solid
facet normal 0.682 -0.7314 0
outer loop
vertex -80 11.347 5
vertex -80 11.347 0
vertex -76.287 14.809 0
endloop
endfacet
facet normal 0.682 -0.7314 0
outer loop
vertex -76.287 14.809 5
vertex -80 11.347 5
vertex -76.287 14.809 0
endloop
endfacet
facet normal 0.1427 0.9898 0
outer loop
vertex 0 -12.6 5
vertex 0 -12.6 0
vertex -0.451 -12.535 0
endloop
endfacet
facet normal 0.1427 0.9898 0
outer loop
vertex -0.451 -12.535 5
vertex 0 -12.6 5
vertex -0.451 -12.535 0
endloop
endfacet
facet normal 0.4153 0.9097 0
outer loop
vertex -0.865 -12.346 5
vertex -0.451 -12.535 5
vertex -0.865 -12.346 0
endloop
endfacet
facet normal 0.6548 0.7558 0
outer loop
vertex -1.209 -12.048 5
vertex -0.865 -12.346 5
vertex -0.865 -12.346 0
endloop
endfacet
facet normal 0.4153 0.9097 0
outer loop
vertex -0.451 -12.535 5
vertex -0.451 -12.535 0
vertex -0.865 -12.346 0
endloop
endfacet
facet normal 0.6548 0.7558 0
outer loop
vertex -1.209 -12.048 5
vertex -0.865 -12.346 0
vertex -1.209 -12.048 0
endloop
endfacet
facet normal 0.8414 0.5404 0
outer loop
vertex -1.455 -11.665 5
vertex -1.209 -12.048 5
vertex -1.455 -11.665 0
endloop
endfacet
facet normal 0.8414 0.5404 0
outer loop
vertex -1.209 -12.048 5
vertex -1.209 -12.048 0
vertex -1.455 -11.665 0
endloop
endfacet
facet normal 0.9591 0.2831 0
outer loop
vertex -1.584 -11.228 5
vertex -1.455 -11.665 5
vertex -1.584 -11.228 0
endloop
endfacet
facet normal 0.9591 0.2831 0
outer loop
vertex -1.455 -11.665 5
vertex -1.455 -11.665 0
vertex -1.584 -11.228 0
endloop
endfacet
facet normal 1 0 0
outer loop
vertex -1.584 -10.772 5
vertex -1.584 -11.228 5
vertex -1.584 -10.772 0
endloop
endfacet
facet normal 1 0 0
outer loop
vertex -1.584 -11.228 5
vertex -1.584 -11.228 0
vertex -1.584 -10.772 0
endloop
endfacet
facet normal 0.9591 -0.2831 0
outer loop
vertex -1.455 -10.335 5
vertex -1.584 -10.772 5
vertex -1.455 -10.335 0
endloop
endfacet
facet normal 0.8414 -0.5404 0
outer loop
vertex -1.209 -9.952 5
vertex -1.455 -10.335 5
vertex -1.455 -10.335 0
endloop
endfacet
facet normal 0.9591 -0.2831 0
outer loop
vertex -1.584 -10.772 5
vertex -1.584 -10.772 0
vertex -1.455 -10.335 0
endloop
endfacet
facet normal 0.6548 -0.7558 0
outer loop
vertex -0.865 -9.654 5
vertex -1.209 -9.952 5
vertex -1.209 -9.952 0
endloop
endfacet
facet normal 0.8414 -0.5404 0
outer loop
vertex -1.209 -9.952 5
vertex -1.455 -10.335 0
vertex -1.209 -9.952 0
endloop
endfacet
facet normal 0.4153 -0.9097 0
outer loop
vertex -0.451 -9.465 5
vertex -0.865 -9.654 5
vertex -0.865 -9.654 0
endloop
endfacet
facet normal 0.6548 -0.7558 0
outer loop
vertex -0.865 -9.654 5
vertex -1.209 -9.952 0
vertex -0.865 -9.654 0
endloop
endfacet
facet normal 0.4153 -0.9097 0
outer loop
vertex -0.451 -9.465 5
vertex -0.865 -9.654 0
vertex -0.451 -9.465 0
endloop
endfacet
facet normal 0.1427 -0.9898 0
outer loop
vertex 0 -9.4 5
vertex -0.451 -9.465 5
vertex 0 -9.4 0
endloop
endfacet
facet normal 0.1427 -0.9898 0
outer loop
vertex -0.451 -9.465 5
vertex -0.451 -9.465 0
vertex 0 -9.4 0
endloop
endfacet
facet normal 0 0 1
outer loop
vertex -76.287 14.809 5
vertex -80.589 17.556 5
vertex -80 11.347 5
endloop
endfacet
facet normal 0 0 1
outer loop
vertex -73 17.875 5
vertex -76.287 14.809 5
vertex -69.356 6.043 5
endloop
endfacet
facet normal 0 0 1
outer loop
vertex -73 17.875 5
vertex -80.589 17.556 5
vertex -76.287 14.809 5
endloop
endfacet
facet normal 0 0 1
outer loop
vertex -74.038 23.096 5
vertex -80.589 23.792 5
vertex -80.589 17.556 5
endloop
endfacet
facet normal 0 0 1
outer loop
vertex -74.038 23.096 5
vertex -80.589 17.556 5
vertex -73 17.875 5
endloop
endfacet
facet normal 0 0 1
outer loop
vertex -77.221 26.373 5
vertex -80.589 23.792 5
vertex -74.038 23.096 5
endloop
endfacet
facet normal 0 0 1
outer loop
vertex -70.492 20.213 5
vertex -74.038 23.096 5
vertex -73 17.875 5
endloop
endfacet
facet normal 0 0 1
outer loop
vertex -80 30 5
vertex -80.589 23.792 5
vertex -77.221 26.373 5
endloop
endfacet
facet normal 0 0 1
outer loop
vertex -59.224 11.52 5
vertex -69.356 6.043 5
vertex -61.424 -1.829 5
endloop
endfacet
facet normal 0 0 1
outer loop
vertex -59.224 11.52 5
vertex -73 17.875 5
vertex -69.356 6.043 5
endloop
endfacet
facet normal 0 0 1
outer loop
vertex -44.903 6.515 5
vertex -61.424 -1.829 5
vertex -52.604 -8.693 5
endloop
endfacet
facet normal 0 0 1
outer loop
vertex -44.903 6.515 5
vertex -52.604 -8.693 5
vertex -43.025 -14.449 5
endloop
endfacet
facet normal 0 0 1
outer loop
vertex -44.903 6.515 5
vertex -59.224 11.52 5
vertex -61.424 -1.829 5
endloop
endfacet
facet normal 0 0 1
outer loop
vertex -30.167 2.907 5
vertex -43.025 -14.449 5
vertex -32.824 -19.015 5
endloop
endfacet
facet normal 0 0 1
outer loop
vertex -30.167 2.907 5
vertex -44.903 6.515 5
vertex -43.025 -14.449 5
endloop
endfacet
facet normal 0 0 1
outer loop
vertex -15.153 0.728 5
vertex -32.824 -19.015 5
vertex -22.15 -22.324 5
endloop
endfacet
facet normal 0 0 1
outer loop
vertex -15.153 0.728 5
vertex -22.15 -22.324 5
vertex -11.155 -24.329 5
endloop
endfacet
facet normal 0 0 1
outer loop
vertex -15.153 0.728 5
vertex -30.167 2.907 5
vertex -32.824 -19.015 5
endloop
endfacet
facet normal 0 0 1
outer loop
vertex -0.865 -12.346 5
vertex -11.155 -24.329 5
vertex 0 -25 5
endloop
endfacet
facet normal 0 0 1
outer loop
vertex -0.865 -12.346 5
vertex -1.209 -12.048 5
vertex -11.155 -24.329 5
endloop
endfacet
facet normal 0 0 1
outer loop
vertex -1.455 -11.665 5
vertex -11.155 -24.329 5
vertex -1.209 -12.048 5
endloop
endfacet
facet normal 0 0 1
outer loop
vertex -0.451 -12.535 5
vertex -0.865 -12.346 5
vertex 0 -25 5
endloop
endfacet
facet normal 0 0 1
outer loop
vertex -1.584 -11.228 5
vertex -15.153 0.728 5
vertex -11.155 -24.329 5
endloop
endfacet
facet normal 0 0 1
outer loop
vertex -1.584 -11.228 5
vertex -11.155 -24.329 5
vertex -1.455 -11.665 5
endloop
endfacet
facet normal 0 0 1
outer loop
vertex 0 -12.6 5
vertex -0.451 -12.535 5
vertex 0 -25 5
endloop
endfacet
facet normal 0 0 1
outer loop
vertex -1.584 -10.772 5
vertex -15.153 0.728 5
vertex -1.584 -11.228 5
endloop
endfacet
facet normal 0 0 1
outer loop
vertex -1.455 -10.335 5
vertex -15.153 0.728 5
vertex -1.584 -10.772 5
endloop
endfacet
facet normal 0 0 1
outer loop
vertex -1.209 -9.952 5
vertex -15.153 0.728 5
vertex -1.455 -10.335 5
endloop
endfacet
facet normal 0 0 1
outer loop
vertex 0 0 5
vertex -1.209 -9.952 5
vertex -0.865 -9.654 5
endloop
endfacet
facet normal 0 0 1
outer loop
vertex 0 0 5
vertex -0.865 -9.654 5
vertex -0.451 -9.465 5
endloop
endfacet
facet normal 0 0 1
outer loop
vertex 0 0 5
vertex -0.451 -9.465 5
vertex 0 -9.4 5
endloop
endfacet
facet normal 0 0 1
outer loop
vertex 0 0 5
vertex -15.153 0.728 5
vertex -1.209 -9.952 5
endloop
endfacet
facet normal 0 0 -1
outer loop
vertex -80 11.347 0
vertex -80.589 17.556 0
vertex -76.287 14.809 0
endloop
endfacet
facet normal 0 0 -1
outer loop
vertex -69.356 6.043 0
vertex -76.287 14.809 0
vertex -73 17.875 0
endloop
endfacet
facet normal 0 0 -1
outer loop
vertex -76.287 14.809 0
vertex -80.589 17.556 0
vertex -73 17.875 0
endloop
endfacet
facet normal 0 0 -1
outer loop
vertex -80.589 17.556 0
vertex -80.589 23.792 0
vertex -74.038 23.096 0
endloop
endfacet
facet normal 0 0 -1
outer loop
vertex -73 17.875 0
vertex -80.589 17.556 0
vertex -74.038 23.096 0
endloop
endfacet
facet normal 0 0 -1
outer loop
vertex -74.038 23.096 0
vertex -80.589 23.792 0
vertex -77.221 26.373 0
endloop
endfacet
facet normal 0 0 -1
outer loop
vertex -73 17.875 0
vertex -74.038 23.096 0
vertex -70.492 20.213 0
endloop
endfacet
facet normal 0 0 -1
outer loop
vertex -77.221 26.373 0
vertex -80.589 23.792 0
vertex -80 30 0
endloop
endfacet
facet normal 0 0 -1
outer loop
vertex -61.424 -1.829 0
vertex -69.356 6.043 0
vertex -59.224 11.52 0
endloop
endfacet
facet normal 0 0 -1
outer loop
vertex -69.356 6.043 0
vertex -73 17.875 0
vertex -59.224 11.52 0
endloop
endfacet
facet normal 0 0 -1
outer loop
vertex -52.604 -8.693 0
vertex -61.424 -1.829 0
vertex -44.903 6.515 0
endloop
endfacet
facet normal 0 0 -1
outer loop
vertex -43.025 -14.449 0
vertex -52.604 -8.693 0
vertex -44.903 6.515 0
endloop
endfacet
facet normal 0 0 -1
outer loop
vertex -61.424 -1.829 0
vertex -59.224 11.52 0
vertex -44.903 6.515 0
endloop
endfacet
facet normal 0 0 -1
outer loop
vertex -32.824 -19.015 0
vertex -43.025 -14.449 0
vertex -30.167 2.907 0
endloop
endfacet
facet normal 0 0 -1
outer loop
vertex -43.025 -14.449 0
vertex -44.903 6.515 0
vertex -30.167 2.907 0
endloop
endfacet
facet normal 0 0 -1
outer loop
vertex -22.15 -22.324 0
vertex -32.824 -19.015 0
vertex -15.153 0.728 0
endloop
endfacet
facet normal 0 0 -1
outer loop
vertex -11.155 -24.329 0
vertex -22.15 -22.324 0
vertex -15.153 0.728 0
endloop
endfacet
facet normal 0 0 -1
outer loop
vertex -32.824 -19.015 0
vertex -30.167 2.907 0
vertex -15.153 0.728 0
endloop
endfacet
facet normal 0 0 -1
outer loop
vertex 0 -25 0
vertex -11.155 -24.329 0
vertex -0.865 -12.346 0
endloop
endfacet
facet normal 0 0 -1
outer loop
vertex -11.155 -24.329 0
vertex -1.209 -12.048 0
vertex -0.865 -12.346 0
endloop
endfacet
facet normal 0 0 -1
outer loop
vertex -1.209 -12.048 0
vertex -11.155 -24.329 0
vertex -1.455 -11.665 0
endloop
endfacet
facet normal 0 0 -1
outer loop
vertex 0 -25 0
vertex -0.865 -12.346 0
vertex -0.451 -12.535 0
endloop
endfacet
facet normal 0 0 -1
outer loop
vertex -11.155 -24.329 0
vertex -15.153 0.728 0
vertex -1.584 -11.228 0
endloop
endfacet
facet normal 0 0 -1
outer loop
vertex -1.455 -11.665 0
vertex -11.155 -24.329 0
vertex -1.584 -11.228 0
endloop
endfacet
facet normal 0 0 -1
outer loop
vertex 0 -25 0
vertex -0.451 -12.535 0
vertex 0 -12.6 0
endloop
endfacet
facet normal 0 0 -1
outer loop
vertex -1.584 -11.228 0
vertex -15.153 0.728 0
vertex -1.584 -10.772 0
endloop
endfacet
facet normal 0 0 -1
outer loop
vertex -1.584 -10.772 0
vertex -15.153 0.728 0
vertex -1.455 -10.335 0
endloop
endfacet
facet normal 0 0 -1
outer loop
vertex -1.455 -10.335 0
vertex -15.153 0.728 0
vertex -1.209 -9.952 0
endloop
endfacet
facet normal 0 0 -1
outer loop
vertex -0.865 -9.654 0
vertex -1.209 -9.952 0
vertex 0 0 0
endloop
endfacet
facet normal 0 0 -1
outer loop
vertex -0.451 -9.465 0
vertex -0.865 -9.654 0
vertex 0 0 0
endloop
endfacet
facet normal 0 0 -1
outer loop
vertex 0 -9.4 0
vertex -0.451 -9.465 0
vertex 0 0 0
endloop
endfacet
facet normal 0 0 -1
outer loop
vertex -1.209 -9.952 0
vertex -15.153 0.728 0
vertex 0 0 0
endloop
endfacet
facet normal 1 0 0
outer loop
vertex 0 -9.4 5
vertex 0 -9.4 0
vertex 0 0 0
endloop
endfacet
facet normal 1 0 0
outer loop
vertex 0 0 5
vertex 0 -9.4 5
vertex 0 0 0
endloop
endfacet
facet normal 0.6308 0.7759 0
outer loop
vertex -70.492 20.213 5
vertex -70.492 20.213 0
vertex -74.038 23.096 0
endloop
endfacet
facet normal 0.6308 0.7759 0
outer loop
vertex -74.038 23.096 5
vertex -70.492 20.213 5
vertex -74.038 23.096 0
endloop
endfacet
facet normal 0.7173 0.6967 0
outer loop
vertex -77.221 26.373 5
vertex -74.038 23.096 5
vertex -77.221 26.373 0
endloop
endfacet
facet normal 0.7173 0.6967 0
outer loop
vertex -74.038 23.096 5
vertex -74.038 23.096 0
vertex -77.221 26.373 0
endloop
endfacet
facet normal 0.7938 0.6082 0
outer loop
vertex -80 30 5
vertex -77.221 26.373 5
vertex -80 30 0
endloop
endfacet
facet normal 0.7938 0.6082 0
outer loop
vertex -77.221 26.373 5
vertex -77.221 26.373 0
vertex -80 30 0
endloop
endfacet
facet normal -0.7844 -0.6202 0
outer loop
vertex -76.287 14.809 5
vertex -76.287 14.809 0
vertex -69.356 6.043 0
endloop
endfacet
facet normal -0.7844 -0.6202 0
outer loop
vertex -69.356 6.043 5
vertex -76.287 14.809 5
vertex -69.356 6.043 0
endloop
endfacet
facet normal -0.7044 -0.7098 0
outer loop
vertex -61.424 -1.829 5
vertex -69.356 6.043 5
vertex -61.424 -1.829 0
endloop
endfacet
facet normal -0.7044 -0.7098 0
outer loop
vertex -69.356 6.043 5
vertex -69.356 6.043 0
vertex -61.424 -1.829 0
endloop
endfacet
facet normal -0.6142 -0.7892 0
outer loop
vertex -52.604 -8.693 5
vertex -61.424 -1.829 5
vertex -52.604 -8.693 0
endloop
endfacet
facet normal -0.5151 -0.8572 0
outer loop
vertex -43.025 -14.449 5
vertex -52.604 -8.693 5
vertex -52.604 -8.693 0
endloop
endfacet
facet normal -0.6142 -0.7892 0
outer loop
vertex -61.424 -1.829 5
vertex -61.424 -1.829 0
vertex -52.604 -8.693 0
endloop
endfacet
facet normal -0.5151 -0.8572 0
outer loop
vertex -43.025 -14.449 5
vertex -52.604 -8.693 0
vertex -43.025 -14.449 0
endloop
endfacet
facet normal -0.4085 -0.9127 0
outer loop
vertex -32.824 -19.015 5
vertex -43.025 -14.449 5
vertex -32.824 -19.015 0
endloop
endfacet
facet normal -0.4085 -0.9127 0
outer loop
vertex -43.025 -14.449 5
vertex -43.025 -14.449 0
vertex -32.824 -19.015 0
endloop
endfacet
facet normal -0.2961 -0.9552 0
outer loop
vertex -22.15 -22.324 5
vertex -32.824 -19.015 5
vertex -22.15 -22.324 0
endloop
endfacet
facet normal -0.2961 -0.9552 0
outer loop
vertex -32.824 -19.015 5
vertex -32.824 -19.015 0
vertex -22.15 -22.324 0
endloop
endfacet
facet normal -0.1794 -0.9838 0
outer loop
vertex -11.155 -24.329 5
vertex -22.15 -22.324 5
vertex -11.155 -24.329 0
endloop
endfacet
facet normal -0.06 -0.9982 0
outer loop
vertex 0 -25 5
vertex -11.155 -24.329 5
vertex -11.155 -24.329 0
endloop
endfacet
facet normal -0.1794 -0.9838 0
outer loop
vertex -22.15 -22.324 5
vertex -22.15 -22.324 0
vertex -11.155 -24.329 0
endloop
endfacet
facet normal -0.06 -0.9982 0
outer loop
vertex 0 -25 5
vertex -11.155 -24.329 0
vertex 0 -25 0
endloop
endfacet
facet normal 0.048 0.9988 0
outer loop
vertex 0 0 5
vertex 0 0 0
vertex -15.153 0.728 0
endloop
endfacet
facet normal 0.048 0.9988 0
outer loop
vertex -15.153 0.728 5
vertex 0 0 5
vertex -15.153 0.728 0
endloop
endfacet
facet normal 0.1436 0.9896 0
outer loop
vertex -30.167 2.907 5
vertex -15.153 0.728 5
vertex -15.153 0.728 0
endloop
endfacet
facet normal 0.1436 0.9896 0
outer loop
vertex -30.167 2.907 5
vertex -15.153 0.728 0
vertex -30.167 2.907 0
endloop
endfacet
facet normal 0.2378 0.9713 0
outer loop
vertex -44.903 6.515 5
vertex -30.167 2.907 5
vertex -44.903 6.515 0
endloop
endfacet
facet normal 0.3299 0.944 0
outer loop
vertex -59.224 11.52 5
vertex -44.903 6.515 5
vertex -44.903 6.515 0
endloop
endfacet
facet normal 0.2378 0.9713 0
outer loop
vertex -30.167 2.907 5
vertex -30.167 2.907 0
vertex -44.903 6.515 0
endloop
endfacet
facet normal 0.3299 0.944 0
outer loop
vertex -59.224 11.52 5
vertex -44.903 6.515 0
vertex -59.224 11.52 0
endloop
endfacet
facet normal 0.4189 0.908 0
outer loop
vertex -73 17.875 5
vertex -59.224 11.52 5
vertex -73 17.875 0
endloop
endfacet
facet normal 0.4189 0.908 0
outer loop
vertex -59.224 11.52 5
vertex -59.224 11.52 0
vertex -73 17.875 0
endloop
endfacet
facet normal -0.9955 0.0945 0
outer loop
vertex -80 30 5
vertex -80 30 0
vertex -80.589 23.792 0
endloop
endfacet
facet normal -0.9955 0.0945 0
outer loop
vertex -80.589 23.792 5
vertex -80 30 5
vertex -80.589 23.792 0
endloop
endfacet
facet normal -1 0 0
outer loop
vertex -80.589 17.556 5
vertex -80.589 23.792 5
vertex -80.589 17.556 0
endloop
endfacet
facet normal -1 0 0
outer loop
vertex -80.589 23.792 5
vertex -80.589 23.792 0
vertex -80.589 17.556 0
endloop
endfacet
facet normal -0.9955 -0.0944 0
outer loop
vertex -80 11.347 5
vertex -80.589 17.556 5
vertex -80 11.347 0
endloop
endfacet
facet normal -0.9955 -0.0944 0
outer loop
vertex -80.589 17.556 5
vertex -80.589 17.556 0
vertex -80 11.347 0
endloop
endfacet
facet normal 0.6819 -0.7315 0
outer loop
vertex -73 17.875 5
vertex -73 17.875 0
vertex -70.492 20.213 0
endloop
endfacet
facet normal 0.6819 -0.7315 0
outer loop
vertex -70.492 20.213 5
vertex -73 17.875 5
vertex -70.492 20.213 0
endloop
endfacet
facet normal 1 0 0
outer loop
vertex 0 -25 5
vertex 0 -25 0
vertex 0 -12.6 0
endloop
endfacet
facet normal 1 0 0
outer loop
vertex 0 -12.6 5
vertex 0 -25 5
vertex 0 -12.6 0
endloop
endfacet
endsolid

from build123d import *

# Parameters (mm, degrees)
EXTRUDE_1_DEPTH = 5


with BuildPart() as part:
    # Эскиз1 → Бобышка-Вытянуть1 (new body)
    with BuildSketch(Plane.XY):
        with BuildLine():
            Line((-80, 11.347450151), (-76.287415542, 14.809491167))
            ThreePointArc((-76.287415542, 14.809491167), (-43.024892089, -14.449127714), (0, -25))
            Line((0, -25), (0, -12.6))
            ThreePointArc((0, -12.6), (-1.6, -11), (0, -9.4))
            Line((0, -9.4), (0, 0))
            ThreePointArc((0, 0), (-37.578310294, 4.533812859), (-73, 17.875055754))
            Line((-73, 17.875055754), (-70.492401879, 20.213428832))
            ThreePointArc((-70.492401879, 20.213428832), (-75.677514984, 24.687695279), (-80, 30))
            ThreePointArc((-80, 30), (-80.662257492, 20.673725075), (-80, 11.347450151))
        make_face()
    extrude(amount=EXTRUDE_1_DEPTH)


solid = part.part
